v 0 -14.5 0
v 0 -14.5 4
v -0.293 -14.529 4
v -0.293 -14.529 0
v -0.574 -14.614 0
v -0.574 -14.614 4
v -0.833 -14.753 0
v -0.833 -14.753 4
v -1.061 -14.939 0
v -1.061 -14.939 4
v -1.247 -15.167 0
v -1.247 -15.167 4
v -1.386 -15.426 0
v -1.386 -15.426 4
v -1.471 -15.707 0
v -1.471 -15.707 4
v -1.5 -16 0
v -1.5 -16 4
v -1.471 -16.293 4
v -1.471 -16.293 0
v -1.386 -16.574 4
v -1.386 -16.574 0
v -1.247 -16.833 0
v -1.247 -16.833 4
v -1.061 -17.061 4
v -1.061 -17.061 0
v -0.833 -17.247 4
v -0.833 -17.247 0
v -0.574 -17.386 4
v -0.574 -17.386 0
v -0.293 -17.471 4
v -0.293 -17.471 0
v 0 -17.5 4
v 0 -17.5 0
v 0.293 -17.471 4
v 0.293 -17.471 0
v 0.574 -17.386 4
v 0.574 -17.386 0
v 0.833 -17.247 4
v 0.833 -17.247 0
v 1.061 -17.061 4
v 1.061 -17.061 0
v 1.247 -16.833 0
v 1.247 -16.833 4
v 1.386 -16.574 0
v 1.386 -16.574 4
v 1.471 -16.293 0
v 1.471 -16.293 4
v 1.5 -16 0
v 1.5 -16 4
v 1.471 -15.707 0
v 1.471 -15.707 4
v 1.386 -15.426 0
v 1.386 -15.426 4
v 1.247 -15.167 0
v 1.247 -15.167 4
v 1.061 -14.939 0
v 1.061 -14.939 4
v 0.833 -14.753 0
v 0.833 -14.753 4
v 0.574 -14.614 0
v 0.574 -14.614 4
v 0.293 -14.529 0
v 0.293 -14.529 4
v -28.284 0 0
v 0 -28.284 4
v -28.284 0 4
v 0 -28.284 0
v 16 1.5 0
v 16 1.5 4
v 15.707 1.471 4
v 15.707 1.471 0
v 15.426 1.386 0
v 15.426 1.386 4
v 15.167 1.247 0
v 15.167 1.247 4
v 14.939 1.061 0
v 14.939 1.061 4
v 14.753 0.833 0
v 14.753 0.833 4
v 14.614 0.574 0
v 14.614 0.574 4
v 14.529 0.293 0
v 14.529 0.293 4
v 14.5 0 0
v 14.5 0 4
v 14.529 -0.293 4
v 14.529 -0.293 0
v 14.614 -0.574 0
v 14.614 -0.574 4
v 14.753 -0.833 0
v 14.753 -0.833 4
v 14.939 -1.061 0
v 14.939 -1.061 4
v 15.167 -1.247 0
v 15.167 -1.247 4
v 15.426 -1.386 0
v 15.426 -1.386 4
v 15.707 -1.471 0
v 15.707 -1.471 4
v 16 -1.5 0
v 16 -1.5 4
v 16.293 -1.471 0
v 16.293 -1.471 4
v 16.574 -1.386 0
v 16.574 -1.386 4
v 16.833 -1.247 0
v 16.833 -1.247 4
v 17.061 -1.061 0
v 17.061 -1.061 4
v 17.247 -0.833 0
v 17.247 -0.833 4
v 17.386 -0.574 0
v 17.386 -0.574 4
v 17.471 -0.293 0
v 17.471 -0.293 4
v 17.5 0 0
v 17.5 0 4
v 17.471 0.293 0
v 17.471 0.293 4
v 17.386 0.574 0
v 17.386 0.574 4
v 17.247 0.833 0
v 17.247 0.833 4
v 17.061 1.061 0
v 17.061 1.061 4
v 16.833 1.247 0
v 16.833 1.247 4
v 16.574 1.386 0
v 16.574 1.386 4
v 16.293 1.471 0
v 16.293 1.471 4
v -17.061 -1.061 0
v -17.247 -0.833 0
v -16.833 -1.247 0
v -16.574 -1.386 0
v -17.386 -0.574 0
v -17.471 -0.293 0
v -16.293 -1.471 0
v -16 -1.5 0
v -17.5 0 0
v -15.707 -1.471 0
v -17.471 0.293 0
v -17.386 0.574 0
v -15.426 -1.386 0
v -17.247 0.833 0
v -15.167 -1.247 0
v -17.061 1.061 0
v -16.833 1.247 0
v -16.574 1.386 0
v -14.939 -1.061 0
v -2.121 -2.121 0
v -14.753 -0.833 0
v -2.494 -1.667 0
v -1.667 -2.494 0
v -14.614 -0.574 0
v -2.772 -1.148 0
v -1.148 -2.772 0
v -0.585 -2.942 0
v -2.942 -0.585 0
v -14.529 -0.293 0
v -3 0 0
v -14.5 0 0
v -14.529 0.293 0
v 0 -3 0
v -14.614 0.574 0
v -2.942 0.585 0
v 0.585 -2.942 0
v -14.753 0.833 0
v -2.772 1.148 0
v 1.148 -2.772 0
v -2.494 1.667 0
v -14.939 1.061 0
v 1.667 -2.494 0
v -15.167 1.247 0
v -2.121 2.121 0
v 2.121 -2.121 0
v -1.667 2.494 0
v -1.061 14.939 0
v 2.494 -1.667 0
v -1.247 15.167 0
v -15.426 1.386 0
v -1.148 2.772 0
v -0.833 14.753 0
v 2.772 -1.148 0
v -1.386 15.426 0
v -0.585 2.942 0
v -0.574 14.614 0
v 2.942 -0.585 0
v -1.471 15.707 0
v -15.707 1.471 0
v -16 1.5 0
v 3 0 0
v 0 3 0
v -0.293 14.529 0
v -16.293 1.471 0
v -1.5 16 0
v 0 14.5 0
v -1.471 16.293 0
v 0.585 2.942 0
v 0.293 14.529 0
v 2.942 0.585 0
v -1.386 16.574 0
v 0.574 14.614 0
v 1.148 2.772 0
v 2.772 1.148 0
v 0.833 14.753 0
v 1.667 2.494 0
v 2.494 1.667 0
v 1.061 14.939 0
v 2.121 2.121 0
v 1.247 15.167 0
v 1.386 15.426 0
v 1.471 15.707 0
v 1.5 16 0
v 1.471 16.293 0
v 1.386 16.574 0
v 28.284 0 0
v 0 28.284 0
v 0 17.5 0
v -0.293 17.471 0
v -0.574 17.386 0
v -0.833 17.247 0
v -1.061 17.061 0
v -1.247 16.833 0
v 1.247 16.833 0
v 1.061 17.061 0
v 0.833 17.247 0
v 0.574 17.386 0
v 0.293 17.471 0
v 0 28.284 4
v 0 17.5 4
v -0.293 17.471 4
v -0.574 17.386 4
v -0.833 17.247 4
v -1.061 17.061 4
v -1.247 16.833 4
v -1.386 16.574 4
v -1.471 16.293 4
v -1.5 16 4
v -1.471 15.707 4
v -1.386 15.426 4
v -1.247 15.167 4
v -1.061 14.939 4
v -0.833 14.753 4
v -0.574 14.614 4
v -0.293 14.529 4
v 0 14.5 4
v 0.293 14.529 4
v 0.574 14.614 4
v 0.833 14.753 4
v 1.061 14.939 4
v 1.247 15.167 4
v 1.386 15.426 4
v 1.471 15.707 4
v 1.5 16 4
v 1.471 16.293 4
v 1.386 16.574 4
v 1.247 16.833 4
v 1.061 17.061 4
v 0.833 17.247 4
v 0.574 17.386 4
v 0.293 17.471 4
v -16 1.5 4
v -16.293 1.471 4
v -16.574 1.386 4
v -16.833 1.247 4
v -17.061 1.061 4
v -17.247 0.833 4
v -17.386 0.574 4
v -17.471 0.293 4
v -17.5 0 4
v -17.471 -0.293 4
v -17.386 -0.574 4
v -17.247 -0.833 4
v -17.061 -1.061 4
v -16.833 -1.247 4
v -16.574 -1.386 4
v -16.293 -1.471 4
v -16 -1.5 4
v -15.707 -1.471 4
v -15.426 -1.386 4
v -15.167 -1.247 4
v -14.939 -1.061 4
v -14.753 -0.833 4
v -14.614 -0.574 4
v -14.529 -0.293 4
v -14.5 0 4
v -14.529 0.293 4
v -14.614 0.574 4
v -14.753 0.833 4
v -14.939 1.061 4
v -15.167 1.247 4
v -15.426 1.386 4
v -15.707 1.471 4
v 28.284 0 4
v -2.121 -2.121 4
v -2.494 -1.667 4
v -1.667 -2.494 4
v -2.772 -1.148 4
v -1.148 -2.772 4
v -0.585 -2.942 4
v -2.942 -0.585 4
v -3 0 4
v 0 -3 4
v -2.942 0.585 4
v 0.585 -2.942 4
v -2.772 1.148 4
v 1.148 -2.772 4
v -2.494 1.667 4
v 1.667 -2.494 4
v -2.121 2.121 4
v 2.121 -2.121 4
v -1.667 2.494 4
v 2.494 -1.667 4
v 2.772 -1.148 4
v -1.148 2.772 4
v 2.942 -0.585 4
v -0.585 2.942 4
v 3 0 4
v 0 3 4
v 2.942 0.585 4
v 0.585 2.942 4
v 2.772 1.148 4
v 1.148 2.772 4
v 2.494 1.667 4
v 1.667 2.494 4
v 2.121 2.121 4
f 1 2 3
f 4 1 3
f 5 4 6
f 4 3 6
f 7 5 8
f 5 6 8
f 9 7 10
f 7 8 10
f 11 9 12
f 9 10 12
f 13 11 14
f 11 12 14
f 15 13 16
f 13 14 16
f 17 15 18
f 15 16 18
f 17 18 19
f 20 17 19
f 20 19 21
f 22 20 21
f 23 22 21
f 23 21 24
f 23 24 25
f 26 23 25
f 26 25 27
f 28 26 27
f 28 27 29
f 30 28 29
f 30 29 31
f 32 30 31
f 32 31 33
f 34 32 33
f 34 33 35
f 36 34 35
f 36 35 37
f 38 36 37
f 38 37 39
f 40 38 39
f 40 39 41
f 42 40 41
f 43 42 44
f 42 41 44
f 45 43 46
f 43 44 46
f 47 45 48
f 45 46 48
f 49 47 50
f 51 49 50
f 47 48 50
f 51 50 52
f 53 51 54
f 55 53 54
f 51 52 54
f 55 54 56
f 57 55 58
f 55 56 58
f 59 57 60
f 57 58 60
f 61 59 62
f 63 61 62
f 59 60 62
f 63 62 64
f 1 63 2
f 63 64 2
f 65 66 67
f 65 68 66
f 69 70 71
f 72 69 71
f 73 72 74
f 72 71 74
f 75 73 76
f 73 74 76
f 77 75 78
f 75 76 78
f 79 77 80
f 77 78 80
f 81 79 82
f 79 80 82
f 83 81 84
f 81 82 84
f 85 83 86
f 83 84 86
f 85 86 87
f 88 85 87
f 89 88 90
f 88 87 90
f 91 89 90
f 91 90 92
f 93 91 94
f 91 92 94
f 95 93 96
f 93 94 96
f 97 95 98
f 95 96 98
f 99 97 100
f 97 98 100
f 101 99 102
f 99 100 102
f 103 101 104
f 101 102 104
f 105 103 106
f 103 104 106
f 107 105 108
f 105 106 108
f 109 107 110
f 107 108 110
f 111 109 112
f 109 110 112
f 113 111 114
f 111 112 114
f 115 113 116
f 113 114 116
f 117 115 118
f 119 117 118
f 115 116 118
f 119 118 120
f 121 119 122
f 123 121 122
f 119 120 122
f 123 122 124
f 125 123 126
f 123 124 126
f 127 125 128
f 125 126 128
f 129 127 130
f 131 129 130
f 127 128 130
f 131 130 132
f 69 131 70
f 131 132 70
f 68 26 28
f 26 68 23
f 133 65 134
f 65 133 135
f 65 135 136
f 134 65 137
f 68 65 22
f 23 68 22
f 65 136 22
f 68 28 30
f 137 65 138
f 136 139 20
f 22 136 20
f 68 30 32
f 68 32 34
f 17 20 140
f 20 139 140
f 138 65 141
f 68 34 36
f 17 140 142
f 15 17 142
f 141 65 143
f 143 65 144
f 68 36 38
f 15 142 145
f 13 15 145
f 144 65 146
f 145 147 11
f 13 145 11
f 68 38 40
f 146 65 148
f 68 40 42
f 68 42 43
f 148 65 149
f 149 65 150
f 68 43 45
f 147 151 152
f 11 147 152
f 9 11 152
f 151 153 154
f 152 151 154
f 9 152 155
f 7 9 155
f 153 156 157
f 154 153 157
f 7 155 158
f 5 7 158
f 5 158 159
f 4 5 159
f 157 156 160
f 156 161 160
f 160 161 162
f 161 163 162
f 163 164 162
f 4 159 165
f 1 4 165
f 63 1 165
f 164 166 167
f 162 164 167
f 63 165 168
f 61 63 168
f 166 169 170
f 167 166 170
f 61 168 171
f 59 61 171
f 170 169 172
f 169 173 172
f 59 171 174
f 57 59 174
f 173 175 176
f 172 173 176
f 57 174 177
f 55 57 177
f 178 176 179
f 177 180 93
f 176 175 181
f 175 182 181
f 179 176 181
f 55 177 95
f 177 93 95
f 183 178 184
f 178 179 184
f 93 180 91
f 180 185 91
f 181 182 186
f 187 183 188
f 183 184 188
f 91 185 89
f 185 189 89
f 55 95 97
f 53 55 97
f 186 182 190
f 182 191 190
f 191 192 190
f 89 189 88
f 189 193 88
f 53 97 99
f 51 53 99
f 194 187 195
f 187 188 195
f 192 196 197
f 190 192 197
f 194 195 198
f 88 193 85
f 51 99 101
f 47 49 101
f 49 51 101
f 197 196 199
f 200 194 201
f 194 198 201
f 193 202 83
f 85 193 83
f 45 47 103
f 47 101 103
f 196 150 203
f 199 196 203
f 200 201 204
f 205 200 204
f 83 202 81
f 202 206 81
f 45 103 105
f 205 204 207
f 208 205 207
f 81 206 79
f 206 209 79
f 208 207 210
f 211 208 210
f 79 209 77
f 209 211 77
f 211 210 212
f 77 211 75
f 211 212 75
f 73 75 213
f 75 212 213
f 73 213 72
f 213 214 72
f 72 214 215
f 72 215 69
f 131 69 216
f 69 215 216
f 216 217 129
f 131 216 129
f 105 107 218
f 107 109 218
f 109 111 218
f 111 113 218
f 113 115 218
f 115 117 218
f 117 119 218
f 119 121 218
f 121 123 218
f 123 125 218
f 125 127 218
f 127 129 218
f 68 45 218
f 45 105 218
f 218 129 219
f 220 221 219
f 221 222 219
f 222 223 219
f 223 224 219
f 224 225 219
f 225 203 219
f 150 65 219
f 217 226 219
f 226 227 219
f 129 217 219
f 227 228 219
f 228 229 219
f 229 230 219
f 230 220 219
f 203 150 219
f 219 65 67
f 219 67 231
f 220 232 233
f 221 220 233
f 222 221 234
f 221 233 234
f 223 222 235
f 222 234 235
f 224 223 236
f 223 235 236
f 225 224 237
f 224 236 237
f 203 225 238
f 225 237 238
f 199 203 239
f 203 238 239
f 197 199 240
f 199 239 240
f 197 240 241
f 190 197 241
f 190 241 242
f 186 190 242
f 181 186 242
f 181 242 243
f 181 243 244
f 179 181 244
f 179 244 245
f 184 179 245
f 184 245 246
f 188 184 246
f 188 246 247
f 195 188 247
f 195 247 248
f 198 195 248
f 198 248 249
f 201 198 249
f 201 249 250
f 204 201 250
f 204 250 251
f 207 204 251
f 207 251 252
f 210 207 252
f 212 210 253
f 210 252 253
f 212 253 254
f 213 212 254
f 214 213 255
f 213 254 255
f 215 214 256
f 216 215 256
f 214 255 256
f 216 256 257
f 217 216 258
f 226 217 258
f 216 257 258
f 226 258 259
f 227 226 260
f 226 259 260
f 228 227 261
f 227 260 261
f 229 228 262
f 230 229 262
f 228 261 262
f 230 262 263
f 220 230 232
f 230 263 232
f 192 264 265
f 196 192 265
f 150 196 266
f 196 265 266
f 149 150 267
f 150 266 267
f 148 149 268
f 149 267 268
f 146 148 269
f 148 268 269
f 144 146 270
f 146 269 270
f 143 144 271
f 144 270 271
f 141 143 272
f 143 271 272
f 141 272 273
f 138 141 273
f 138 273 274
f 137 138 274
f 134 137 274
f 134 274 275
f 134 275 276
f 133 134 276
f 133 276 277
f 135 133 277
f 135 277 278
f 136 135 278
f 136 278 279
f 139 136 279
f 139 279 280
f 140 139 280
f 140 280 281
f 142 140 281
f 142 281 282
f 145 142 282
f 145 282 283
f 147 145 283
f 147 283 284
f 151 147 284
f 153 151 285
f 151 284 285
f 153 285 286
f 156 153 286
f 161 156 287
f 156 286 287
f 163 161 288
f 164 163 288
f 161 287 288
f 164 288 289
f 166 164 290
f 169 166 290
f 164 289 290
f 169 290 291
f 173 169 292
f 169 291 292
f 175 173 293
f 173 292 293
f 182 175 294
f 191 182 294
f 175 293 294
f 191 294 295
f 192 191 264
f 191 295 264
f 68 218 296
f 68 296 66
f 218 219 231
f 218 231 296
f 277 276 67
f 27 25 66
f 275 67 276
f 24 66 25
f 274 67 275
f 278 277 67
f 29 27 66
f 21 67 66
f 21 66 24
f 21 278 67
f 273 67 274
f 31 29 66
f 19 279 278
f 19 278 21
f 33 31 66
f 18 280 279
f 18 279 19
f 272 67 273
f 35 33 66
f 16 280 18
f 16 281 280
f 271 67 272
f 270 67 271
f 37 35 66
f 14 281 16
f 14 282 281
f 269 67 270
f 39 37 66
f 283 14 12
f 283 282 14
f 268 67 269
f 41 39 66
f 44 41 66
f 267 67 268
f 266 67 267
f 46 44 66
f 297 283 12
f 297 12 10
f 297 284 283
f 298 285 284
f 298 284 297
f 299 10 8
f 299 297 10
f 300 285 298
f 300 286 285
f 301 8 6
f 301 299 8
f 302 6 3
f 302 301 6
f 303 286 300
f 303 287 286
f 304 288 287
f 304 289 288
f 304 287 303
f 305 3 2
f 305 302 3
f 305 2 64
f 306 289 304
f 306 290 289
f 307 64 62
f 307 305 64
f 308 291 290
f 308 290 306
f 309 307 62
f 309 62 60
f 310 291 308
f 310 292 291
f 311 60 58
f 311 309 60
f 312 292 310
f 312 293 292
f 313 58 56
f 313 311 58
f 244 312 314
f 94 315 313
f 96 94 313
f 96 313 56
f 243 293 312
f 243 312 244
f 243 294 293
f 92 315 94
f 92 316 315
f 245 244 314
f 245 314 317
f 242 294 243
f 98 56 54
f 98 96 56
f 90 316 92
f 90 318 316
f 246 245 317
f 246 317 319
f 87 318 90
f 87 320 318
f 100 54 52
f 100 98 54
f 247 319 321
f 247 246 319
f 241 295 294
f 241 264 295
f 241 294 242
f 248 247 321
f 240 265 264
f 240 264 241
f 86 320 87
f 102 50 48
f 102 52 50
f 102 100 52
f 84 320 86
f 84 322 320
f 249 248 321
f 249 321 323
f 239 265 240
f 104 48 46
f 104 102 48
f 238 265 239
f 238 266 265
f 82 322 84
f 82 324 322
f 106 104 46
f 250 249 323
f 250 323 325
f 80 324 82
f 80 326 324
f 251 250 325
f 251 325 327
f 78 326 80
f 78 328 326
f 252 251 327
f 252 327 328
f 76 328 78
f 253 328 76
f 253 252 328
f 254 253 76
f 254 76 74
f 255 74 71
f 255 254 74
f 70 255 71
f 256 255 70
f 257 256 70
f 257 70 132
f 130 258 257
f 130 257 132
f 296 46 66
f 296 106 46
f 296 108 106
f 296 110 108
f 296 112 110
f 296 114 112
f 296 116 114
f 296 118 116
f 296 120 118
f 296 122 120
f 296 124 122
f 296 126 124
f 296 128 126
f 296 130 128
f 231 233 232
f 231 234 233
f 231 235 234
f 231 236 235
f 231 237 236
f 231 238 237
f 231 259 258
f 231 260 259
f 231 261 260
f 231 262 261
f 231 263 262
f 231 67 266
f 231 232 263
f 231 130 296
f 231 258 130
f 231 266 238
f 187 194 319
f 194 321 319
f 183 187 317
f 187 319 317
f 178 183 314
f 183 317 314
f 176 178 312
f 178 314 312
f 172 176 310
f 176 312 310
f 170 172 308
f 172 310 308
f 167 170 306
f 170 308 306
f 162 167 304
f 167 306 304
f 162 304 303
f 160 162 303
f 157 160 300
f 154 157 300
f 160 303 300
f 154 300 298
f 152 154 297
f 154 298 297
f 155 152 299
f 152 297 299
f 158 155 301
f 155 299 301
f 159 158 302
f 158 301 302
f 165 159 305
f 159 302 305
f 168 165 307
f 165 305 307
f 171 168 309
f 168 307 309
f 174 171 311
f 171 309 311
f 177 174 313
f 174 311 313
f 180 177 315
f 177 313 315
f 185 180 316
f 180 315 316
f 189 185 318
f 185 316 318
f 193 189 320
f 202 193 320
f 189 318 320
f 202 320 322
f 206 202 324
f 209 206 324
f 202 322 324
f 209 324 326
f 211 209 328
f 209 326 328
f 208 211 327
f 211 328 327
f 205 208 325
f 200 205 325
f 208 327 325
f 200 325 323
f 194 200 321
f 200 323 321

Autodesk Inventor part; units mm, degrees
ref_plane "YZ Plane" through (0, 0, 0) normal (1, 0, 0) x (0, 1, 0)
ref_plane "XZ Plane" through (0, 0, 0) normal (0, 1, 0) x (-1, 0, 0)
ref_plane "XY Plane" through (0, 0, 0) normal (0, 0, 1) x (1, 0, 0)
sketch "Náčrt1" plane through (0, 0, 0) normal (0, 0, 1) x (1, 0, 0)
  line L0 (-28.2843, 0) -> (0, 28.2843)
  line L1 (0, 28.2843) -> (28.2843, 0)
  line L2 (28.2843, 0) -> (0, -28.2843)
  line L3 (0, -28.2843) -> (-28.2843, 0)
  line L4 (-28.2843, 0) -> (28.2843, 0) construction
  line L5 (0, 28.2843) -> (0, -28.2843) construction
  line L6 (-28.2843, 0) -> (11.7157, 0) construction
  line L7 (0, 39.598) -> (0, -39.598) projected
  line L8 (-39.598, 0) -> (39.598, 0) projected
  point P0 (0, 0)
  point P1 (-16, 0)
  point P2 (16, 0)
  point P3 (0, 0)
  point P4 (0, 16)
  point P5 (0, -16)
  point P6 (0, 0)
  point P7 (0, 0)
  dimension "d0" = 40
  dimension "d2" = 40
  dimension "d3" = 32
  dimension "d4" = 16
  dimension "d5" = 32
  dimension "d6" = 16
  dimension "d9" = 90
  dimension "d10" = 90
extrude "Vysunutí1" add sketch "Náčrt1" along normal blind 4
hole "Díra1" at (-16, 0, 0) at (16, 0, 0) at (0, 16, 0) at (0, -16, 0) direction (0, 0, 1) diameter 3 end through all
hole "Díra2" at (0, 0, 0) direction (0, 0, 1) diameter 6 end through all
equation "\"d4\" = 0.5 * d3"
equation "\"d6\" = 0.5 * d5"
properties part number "drzakmotoru_nový"
